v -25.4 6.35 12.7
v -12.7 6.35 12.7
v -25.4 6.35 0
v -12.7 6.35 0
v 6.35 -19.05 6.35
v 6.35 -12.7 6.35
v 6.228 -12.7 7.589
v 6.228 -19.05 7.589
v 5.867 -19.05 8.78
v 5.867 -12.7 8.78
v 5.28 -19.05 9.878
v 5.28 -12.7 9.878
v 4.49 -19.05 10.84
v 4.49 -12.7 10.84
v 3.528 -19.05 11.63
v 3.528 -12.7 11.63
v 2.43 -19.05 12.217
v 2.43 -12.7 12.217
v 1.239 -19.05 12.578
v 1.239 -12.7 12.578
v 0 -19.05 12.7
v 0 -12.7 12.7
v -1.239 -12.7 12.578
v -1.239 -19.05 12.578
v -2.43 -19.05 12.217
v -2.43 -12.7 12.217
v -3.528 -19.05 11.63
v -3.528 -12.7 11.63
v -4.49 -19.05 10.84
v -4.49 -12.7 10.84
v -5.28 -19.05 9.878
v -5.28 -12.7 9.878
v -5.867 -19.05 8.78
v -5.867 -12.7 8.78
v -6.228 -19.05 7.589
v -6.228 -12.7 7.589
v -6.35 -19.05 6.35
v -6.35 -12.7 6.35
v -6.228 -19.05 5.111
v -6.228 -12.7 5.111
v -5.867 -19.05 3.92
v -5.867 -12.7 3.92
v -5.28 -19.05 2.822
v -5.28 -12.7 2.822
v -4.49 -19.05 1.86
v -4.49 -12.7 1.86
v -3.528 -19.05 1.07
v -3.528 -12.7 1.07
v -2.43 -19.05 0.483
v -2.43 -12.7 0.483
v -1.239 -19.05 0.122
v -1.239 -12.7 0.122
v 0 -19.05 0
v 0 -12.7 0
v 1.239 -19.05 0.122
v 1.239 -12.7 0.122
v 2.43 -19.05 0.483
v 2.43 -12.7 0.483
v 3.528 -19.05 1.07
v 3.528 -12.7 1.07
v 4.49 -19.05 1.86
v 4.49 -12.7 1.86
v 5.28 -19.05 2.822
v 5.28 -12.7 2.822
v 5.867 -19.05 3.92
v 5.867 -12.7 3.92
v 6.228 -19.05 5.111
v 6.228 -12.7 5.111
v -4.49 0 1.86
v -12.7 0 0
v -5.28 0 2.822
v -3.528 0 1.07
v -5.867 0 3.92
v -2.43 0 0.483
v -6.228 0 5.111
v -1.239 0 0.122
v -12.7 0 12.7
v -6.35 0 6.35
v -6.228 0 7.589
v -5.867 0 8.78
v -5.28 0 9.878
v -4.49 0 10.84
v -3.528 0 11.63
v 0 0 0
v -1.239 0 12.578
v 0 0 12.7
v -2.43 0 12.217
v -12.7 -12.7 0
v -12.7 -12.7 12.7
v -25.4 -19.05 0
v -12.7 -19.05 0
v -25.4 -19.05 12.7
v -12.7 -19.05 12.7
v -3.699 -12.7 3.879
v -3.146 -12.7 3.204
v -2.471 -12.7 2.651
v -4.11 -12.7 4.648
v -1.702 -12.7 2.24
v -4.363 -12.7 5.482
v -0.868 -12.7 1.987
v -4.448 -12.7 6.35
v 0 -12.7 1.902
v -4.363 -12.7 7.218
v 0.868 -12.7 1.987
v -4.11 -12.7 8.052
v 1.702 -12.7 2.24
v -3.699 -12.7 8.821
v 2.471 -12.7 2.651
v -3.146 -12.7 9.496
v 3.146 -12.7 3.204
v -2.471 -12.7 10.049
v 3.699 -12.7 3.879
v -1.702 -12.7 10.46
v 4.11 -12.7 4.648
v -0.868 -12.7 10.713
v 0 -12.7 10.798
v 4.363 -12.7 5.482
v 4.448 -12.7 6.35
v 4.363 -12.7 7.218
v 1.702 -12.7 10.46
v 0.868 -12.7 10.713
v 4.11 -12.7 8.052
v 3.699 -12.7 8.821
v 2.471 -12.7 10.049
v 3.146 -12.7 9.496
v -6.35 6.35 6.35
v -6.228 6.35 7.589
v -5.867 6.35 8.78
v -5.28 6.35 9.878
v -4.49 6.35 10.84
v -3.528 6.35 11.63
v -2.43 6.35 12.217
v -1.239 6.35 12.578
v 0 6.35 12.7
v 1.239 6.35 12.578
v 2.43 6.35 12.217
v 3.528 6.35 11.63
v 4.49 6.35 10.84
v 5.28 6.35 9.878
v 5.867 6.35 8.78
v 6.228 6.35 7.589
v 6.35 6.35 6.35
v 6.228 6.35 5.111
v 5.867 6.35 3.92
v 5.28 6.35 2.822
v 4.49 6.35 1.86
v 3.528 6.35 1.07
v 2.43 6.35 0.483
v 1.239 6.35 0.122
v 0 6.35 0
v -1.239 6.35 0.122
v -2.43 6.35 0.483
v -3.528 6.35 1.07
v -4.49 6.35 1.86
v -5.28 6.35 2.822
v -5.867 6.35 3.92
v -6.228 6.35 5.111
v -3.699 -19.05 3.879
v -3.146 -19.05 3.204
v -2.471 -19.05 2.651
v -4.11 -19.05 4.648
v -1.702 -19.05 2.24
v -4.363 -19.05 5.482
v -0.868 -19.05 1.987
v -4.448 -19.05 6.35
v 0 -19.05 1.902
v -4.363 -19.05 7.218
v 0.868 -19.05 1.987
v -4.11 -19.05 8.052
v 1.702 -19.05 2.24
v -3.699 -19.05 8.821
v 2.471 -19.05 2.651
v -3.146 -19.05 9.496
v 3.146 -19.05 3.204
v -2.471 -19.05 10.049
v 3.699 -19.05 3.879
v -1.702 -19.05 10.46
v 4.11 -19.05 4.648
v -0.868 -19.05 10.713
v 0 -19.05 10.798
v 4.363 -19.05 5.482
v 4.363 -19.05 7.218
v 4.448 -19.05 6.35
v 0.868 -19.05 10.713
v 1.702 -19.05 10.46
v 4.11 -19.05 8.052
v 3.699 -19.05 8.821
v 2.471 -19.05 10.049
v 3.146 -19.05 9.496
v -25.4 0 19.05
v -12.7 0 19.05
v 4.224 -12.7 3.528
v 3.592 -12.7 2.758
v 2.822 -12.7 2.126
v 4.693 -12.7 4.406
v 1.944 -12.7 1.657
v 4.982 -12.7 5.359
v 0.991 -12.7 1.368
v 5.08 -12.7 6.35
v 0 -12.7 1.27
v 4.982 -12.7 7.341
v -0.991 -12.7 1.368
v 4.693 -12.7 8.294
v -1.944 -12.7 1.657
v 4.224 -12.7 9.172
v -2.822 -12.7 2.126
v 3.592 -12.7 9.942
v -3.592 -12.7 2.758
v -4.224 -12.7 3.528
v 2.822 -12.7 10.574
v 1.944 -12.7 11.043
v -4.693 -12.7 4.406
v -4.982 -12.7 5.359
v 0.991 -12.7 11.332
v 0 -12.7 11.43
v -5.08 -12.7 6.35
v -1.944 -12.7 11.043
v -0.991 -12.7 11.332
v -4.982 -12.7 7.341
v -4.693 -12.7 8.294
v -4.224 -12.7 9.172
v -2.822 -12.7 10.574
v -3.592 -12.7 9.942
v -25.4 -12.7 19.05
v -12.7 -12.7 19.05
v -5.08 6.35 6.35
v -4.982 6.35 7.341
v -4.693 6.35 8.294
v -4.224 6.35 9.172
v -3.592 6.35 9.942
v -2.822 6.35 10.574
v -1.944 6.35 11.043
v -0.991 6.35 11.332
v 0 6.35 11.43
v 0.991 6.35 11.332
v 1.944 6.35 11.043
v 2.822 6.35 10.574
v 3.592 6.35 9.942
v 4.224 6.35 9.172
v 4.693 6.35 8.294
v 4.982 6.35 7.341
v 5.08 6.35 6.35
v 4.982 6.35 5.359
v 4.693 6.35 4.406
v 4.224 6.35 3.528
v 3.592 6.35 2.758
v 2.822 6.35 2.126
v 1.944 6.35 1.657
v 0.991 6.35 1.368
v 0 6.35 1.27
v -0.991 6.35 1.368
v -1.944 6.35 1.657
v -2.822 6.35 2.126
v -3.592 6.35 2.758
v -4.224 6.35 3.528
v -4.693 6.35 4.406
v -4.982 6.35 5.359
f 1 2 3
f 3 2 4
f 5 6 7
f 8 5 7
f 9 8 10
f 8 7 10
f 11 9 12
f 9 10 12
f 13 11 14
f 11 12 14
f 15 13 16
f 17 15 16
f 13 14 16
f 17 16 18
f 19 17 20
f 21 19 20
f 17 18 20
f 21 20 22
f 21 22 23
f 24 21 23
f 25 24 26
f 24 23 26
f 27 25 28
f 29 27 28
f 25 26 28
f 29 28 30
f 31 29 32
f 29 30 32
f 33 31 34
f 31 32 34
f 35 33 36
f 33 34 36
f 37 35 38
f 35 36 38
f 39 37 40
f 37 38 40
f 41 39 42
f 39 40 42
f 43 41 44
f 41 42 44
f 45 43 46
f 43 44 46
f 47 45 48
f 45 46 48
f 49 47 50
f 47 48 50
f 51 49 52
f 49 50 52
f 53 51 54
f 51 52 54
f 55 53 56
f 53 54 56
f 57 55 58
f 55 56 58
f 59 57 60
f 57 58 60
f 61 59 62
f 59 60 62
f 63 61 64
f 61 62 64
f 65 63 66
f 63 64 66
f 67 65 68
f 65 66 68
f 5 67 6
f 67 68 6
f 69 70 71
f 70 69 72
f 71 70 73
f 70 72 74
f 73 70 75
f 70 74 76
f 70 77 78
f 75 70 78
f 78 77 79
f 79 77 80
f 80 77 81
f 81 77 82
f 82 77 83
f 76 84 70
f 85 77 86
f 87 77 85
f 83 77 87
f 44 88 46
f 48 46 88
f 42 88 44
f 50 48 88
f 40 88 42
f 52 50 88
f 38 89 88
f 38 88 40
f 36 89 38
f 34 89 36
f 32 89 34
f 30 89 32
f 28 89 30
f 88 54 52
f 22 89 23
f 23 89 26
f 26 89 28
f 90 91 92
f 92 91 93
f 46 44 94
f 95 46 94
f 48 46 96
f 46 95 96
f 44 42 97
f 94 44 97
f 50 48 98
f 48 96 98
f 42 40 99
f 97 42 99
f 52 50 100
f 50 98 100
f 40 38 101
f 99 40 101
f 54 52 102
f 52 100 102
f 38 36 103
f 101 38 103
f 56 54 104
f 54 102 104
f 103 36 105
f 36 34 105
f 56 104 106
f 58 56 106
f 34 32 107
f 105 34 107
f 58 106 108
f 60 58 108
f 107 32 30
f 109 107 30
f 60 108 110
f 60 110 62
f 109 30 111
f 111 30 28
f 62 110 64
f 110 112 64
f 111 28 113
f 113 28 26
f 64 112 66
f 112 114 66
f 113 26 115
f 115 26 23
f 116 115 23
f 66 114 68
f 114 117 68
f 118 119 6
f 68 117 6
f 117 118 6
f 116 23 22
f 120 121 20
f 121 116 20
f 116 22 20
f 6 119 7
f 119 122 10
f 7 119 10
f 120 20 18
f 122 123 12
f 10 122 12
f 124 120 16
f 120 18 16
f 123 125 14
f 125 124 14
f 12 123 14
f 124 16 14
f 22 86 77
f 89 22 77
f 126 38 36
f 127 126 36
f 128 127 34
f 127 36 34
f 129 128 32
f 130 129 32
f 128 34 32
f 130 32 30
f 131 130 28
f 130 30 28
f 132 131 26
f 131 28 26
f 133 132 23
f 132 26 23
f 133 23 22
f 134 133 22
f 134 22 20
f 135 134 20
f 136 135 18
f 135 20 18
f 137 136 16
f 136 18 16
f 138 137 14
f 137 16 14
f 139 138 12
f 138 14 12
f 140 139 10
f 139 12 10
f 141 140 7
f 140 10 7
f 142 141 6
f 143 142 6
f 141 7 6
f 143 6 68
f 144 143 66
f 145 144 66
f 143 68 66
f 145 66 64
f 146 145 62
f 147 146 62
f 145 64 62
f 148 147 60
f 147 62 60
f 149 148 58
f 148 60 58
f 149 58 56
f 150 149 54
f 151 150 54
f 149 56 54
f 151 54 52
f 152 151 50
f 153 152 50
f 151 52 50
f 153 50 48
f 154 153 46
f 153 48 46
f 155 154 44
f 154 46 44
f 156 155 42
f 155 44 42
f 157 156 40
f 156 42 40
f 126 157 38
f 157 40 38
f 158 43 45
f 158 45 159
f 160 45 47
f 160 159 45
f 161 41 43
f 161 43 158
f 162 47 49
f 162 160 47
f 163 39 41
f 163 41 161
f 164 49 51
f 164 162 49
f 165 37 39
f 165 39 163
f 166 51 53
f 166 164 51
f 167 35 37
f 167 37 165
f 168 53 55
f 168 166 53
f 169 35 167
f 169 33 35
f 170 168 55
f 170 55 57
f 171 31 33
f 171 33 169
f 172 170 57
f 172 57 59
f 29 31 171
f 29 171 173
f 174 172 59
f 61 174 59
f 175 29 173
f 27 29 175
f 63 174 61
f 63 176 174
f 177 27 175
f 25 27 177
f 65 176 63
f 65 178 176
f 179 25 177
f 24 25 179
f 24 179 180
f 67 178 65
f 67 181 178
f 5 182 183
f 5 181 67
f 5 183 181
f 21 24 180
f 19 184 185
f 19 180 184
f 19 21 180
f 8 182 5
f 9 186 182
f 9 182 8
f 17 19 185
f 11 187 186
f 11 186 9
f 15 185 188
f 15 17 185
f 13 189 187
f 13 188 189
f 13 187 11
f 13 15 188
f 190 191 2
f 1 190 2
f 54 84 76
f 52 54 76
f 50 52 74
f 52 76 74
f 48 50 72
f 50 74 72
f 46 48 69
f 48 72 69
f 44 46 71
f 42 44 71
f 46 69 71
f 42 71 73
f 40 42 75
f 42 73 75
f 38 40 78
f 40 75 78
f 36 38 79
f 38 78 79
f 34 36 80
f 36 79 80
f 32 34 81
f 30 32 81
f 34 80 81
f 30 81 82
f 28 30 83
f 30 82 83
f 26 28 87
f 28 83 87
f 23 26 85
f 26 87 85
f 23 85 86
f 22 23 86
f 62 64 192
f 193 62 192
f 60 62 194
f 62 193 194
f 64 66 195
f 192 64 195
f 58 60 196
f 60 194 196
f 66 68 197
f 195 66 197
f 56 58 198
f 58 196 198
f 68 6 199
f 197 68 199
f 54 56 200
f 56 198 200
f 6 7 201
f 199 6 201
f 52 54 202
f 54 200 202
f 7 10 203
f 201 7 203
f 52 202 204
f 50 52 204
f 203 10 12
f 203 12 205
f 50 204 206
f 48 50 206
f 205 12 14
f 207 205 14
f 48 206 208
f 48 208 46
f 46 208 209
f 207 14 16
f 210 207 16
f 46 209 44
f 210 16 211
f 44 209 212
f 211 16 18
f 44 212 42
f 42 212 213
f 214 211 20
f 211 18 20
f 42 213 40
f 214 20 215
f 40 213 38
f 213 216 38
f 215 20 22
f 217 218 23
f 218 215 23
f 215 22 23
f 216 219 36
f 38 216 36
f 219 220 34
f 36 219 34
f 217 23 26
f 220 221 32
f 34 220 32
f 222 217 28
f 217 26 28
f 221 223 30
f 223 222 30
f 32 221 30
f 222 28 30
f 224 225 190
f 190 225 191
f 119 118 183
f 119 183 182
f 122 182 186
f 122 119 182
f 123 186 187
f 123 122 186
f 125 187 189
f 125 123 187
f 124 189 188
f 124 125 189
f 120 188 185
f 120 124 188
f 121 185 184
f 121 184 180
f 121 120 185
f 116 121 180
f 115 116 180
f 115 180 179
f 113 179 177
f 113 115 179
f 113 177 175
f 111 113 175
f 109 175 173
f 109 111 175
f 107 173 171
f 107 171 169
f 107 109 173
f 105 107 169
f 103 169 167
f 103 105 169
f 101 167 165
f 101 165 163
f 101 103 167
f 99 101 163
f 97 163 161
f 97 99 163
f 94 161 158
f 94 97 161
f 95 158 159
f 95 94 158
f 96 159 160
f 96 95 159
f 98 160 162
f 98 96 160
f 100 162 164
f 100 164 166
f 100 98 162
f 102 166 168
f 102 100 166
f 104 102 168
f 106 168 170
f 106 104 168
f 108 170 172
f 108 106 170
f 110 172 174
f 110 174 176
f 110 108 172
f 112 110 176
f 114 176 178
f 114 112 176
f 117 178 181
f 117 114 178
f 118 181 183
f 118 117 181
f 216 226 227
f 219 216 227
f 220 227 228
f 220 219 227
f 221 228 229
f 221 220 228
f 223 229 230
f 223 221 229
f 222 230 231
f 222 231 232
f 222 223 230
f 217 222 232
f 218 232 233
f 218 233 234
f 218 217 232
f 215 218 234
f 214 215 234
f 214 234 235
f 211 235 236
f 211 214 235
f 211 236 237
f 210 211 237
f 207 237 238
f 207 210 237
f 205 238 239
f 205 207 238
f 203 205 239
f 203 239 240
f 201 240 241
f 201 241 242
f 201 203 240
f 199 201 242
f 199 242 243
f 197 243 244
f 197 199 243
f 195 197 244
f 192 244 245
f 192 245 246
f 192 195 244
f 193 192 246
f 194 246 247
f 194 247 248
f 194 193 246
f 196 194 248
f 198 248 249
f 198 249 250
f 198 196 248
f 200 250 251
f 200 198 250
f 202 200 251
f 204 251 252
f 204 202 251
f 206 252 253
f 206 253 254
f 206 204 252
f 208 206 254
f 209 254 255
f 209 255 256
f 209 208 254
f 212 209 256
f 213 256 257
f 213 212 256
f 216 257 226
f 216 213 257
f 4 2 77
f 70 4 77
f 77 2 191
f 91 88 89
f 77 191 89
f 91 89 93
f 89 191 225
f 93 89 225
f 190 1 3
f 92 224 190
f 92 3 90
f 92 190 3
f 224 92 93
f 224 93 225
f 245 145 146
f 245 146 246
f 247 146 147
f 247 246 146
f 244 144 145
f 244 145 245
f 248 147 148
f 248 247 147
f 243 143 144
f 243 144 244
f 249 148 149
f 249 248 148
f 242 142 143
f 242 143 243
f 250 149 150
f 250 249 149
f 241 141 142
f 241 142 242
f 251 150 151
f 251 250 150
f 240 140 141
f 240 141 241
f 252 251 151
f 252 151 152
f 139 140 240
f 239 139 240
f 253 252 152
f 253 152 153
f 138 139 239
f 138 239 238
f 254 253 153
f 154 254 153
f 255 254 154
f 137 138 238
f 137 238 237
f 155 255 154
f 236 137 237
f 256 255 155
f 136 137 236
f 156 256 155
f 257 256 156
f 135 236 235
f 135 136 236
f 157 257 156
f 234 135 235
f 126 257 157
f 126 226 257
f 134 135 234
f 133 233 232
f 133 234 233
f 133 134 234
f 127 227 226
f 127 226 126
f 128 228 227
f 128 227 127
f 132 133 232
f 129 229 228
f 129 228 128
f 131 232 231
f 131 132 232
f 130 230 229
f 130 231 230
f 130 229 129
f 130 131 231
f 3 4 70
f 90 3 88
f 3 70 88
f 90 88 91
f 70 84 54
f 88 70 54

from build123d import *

# Parameters (mm, degrees)
F1_DEPTH = 12.7
F2_R     = 6.35
F2_R_2   = 4.448414
F3_DEPTH = 6.35
F4_R     = 6.35
F4_R_2   = 5.08
F5_DEPTH = 19.05
F7_DEPTH = 12.7


with BuildPart() as f1:
    # F0 (on Front) → F1 (new body)
    with BuildSketch(Plane.XZ):
        with BuildLine():
            Line((-12.7, 0), (0, 0))
            ThreePointArc((0, 0), (-6.35, 6.35), (0, 12.7))
            Line((0, 12.7), (-12.7, 12.7))
            Line((-12.7, 12.7), (-12.7, 0))
        make_face()
    extrude(amount=F1_DEPTH)

    # F6 (on face) → F7 (join)
    with BuildSketch(Plane(origin=(-12.7, 0, 0), x_dir=(0, -1, 0), z_dir=(-1, 0, 0))):
        Polygon((12.7, 19.05), (0, 19.05), (-6.35, 12.7), (-6.35, 0), (19.05, 0), (19.05, 12.7), align=None)
    extrude(amount=F7_DEPTH)


with BuildPart() as f3:
    # F2 (on face) → F3 (new body)
    with BuildSketch(Plane.XZ.offset(12.7)):
        with Locations((0, 6.35)):
            Circle(F2_R)
        with Locations((0, 6.35)):
            Circle(F2_R_2, mode=Mode.SUBTRACT)
    extrude(amount=F3_DEPTH)


with BuildPart() as f5:
    # F4 (on face) → F5 (new body)
    with BuildSketch(Plane(origin=(0, -12.7, 0), x_dir=(-1, 0, 0), z_dir=(0, 1, 0))):
        with Locations((0, 6.35)):
            Circle(F4_R)
        with Locations((0, 6.35)):
            Circle(F4_R_2, mode=Mode.SUBTRACT)
    extrude(amount=F5_DEPTH)


solid = Compound([f1.part, f3.part, f5.part])
